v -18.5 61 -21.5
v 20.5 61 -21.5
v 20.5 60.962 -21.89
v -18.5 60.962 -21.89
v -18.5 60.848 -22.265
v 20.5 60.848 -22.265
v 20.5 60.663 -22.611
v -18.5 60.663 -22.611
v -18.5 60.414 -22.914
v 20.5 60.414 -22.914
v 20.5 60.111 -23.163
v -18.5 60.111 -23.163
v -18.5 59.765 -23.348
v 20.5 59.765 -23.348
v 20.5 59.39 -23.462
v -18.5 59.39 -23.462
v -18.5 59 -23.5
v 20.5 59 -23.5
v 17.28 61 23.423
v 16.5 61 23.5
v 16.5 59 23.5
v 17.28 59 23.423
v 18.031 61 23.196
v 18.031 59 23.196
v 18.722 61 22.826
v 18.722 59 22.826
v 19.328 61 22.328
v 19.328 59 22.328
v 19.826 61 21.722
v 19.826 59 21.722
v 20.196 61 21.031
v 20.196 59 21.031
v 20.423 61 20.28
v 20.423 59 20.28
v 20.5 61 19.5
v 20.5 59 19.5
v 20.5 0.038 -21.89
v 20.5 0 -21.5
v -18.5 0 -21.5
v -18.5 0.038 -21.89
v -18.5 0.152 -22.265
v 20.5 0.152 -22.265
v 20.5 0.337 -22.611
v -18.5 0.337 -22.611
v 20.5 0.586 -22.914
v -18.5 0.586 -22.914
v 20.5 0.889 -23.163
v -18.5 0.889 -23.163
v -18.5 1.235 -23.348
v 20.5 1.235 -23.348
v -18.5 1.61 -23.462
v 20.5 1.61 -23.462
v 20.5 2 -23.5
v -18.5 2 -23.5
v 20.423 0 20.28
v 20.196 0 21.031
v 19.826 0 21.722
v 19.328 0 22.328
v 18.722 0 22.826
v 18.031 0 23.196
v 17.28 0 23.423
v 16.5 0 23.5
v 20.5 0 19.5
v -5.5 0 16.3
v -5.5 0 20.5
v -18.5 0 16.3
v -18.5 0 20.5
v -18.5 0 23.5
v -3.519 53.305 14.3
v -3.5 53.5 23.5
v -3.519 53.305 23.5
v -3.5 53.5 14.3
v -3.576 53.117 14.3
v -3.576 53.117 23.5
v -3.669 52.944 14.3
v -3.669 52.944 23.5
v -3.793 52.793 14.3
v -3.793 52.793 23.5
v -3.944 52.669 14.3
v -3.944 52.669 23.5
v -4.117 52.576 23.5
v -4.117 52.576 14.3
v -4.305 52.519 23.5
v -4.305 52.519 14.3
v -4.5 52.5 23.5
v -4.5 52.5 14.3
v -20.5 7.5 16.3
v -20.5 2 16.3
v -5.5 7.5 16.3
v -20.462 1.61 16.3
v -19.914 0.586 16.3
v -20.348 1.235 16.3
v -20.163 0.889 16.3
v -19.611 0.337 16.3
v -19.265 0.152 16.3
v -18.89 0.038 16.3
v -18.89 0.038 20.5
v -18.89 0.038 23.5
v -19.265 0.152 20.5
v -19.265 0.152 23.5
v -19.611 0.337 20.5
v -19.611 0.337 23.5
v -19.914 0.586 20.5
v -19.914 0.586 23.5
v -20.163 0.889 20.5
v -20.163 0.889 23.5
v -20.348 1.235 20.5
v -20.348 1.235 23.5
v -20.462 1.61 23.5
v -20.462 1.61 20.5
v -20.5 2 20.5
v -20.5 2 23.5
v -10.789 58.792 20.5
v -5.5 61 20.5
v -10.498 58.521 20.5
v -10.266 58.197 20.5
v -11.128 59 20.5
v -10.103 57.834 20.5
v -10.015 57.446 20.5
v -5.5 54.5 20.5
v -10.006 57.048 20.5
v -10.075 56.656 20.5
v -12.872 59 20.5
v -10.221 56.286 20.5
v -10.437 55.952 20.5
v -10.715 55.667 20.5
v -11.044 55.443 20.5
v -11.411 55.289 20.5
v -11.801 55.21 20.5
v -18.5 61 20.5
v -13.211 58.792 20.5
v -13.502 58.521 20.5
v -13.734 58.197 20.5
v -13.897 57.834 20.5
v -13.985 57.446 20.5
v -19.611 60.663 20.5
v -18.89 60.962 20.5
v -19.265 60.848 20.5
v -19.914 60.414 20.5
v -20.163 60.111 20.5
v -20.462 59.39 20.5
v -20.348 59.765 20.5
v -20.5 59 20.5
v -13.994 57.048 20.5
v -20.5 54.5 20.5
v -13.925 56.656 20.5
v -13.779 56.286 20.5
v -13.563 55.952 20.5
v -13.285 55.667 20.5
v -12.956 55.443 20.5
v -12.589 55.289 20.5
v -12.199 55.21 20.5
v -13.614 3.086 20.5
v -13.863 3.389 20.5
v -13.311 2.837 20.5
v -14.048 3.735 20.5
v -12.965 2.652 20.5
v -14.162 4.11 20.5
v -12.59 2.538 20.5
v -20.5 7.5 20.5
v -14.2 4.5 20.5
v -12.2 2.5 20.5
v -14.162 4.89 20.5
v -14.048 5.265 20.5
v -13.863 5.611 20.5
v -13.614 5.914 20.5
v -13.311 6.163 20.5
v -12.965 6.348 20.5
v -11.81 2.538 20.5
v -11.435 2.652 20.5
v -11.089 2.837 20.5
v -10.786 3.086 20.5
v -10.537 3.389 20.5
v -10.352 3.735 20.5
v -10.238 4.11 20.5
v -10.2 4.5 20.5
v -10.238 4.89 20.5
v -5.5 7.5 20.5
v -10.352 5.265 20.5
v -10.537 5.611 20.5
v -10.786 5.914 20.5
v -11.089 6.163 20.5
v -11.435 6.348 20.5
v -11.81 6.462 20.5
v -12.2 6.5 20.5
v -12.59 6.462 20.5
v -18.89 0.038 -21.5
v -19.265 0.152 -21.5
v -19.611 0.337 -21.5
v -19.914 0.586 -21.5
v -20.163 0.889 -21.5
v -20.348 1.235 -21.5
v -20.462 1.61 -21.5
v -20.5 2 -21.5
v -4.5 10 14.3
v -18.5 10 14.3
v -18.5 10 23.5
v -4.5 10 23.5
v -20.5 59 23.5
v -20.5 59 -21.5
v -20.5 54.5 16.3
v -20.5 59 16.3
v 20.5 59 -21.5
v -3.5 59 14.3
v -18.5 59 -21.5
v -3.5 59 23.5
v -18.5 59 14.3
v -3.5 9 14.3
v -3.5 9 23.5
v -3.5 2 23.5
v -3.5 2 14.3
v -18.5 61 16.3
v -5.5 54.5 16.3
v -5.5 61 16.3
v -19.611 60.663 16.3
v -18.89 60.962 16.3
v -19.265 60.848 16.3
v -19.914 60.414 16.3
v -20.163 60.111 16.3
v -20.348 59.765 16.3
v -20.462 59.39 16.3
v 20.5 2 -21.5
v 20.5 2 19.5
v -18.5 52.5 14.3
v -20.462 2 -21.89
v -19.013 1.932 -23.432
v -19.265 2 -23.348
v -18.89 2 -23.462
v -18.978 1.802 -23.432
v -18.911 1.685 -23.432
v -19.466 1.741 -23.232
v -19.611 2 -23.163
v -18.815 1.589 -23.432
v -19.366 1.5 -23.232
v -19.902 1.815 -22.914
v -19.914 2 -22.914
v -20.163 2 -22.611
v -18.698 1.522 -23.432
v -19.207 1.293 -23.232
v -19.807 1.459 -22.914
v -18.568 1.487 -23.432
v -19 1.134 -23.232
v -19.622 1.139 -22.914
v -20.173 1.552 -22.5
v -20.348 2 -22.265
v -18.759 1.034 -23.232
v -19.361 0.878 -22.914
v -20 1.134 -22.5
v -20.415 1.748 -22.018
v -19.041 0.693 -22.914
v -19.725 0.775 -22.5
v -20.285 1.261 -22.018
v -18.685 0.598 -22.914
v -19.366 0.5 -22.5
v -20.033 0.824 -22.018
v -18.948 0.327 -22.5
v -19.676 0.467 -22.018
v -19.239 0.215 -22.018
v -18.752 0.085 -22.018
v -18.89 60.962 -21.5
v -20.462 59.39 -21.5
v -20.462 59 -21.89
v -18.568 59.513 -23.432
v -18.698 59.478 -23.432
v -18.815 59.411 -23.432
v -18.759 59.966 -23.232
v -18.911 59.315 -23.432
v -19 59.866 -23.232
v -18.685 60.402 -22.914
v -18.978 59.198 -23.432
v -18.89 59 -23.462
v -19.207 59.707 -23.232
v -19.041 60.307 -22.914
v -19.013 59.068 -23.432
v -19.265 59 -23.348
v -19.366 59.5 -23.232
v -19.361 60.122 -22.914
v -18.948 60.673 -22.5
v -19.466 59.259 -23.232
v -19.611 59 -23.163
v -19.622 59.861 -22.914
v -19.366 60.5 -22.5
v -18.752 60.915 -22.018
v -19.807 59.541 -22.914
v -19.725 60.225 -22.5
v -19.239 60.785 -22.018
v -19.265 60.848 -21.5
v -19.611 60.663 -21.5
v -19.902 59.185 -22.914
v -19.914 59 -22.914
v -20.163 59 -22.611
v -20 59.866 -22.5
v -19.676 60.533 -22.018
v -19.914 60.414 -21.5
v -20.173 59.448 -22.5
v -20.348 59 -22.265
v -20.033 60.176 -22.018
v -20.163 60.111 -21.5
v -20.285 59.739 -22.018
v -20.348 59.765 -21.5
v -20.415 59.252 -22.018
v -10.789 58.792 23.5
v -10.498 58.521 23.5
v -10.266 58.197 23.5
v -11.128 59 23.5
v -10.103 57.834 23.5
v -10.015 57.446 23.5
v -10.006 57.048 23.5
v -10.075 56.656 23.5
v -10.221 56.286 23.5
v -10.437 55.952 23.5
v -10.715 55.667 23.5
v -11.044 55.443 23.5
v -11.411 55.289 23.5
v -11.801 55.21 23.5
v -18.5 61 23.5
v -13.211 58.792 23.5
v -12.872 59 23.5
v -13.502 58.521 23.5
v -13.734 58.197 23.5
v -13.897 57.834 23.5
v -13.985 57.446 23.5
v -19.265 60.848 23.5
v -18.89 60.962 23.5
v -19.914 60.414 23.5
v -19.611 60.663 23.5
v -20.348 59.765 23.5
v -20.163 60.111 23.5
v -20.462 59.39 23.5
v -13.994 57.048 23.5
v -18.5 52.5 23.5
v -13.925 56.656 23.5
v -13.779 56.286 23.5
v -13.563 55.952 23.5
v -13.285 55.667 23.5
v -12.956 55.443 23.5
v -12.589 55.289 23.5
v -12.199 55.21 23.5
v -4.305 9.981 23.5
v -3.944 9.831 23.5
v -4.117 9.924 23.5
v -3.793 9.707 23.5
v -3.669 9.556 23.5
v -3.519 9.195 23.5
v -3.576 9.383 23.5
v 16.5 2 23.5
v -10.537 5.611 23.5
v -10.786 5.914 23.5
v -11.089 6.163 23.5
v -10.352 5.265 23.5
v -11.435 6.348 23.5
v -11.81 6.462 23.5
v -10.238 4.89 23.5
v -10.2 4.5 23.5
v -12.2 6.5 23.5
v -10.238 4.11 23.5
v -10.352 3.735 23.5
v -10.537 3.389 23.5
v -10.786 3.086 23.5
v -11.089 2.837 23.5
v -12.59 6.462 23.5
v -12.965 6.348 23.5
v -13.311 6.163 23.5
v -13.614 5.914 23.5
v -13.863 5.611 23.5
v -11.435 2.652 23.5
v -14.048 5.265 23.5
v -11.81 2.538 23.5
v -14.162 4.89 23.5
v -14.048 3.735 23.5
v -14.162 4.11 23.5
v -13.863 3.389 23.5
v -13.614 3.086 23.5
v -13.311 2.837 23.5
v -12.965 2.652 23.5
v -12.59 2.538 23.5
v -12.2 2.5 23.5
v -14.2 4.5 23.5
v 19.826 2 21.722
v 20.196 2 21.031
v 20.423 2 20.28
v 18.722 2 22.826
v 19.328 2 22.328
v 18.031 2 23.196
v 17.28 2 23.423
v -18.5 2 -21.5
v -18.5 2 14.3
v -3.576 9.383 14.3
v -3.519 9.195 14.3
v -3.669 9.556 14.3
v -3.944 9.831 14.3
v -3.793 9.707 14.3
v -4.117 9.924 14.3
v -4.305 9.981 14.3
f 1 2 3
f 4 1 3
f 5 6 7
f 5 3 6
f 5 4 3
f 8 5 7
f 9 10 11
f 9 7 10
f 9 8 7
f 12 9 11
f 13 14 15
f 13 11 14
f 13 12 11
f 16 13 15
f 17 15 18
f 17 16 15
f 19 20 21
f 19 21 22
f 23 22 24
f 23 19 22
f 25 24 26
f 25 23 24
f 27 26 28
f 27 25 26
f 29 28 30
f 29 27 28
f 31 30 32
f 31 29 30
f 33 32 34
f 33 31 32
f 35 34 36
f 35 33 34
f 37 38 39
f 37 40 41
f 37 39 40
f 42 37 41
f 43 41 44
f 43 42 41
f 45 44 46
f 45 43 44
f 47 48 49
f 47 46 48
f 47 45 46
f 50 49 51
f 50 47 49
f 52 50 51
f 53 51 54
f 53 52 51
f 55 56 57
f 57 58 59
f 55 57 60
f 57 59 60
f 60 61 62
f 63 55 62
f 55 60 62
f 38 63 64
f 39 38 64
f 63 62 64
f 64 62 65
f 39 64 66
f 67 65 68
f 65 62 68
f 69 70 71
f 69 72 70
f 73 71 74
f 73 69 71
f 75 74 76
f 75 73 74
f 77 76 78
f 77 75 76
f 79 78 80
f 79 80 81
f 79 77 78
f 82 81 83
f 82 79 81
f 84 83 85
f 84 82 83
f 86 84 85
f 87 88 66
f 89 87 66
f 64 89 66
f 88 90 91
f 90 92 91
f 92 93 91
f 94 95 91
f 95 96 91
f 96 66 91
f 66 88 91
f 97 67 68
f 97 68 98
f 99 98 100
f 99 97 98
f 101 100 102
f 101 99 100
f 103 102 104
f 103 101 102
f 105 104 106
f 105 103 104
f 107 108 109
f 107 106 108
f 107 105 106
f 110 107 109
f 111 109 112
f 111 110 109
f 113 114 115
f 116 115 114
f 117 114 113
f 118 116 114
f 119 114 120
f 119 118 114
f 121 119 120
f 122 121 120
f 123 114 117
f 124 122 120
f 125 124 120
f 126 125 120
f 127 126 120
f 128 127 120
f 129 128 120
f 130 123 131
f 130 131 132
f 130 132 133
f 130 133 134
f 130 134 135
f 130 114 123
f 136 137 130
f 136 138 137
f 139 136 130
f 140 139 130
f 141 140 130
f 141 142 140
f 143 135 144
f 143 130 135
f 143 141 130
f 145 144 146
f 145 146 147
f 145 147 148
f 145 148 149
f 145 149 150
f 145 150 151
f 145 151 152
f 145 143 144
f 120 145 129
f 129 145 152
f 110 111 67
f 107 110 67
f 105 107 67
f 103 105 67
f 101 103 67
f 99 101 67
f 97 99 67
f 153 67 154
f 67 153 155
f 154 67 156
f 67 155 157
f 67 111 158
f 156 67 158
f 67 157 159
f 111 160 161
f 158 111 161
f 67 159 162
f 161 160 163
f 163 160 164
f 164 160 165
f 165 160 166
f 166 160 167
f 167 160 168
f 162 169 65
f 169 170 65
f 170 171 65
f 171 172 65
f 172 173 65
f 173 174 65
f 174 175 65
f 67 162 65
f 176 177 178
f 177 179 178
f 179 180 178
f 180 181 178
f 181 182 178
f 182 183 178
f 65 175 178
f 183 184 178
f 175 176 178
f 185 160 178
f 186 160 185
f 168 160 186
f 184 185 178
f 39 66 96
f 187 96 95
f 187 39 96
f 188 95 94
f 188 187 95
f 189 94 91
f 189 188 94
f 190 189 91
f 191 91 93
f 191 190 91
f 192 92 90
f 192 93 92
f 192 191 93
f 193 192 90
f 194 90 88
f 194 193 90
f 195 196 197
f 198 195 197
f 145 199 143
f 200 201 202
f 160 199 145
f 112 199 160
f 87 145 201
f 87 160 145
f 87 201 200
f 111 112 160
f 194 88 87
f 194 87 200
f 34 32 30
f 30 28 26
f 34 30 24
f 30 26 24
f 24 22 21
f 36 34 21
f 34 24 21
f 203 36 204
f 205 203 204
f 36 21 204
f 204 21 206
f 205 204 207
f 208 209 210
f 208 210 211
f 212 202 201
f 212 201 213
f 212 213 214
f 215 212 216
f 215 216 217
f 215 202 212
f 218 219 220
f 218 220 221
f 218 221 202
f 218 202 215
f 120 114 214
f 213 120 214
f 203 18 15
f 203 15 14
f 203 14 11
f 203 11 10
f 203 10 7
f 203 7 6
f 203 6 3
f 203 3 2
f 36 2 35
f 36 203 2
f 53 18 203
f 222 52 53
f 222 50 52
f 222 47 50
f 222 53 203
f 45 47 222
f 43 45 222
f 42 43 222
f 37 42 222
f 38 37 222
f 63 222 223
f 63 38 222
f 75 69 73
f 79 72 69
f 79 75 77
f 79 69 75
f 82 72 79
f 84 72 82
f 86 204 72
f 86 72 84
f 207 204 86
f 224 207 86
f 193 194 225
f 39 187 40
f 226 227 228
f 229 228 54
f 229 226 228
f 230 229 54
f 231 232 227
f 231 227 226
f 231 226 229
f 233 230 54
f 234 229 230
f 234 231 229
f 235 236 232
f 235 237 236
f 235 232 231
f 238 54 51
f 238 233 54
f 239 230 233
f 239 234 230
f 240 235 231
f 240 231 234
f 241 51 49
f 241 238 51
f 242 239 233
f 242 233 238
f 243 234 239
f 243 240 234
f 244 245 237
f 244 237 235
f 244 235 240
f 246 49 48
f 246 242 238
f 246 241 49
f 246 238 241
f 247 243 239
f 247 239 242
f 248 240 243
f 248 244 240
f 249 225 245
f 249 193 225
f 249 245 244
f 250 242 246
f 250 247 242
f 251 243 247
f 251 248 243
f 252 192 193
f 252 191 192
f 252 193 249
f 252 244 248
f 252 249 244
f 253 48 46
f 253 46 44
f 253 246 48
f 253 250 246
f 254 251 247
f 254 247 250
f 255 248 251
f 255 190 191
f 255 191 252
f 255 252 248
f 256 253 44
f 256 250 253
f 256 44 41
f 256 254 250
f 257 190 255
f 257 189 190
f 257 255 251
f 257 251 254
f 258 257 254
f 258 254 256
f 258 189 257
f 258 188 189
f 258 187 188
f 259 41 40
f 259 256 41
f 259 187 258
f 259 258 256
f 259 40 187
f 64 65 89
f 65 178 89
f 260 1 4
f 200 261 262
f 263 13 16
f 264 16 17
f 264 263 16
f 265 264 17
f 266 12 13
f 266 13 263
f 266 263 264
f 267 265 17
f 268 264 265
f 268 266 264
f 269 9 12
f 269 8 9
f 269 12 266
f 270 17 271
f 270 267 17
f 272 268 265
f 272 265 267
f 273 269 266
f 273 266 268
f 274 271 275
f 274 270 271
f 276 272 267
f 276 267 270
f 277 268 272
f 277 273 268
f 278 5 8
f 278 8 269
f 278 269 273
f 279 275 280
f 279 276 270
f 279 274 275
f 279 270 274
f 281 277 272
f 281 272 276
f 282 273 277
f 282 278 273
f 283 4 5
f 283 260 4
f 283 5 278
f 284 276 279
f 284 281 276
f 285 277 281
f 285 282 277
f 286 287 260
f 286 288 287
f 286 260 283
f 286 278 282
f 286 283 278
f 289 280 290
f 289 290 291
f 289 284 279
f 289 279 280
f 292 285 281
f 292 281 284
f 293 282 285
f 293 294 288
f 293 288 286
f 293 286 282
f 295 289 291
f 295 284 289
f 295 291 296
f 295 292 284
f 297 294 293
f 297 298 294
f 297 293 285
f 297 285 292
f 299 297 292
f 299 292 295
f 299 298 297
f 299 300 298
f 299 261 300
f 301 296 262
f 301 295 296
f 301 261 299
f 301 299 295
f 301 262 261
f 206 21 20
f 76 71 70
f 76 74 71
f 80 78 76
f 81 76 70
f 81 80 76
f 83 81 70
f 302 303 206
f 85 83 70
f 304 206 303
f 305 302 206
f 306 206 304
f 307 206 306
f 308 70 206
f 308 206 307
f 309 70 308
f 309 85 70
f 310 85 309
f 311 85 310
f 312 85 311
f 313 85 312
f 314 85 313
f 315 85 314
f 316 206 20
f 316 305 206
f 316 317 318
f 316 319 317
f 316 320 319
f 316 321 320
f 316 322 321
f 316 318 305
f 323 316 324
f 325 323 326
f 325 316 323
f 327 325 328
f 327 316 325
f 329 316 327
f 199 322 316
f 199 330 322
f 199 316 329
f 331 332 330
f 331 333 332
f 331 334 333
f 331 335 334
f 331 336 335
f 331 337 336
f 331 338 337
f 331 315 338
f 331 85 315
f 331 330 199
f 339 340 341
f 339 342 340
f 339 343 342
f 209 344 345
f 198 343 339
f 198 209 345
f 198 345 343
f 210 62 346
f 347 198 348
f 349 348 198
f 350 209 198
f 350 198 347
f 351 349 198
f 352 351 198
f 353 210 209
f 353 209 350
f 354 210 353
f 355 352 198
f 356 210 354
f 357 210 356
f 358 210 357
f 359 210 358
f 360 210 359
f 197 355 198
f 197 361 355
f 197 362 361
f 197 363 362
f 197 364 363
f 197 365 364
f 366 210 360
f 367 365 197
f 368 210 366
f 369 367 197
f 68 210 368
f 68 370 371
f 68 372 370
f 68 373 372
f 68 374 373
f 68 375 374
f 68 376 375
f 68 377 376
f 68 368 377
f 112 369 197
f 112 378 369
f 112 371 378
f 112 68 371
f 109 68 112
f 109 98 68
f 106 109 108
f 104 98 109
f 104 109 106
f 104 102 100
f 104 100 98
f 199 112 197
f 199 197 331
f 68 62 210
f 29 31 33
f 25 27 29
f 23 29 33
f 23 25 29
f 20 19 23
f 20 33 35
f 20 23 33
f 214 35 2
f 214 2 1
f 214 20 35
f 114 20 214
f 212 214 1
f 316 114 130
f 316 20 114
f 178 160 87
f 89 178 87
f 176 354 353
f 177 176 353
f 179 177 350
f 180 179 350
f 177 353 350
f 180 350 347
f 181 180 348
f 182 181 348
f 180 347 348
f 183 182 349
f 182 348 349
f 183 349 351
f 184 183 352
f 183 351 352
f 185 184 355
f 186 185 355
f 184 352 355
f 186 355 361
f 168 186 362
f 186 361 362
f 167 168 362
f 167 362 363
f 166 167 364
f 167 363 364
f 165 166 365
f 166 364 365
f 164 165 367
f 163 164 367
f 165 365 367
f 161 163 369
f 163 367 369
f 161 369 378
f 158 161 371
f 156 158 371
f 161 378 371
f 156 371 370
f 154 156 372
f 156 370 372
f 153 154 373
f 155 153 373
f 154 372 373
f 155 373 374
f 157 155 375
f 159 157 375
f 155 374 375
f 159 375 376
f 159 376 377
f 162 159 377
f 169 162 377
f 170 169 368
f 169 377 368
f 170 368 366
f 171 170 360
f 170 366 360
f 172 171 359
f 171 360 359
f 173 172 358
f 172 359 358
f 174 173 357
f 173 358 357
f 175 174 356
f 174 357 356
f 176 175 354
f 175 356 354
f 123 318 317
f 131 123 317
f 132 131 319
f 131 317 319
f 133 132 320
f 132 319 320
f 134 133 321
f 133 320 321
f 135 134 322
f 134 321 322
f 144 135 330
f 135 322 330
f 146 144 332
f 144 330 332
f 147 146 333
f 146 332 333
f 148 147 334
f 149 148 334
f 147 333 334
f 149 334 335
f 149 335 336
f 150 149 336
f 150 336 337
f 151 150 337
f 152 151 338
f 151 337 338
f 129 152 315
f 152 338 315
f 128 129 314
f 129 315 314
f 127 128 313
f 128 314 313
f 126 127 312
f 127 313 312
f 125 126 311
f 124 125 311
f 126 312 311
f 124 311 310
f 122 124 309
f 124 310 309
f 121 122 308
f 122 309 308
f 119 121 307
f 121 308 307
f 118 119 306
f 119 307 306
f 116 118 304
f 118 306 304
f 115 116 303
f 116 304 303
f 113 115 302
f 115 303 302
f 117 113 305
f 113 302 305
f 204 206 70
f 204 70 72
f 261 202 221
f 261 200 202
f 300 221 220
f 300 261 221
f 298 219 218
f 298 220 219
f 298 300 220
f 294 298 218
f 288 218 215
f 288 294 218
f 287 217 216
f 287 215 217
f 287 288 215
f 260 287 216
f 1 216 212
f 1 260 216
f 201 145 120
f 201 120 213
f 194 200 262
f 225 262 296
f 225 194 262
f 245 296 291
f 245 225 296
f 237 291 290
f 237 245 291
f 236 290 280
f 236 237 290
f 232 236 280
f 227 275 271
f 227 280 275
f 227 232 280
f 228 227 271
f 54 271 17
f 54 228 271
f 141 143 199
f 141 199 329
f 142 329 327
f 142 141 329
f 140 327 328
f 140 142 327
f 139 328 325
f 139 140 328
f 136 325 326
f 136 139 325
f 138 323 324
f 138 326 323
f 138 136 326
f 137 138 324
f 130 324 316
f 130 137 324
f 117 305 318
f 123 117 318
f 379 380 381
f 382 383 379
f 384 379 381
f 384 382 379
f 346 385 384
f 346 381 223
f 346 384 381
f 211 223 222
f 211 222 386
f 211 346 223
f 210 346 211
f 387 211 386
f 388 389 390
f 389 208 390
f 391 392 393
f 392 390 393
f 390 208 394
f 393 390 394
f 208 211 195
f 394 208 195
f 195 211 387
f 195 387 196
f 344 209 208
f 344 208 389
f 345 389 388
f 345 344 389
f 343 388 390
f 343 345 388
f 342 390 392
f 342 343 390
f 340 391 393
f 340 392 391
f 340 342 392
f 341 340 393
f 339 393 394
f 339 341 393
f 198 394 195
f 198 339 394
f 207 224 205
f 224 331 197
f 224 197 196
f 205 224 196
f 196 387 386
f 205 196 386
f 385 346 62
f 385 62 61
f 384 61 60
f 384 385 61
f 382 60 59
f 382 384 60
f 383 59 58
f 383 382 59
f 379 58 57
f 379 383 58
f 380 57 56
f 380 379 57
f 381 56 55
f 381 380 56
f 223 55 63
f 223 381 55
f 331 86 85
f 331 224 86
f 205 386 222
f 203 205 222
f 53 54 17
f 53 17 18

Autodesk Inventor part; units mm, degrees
ref_plane "YZ Plane" through (0, 0, 0) normal (1, 0, 0) x (0, 1, 0)
ref_plane "XZ Plane" through (0, 0, 0) normal (0, 1, 0) x (-1, 0, 0)
ref_plane "XY Plane" through (0, 0, 0) normal (0, 0, 1) x (1, 0, 0)
sketch "Esboço1" plane through (0, 0, 0) normal (0, 1, 0) x (-1, 0, 0)
  line L0 (-20.5, 23.5) -> (20.5, 23.5)
  line L1 (20.5, 23.5) -> (20.5, -23.5)
  line L2 (20.5, -23.5) -> (-20.5, -23.5)
  line L3 (-20.5, -23.5) -> (-20.5, 23.5)
  line L4 (-20.5, 23.5) -> (20.5, -23.5) construction
  line L5 (20.5, 23.5) -> (-20.5, -23.5) construction
  point P0 (0, 0)
  dimension "d0" = 41
  dimension "d1" = 47
extrude "Extrusão1" add sketch "Esboço1" along normal blind 61
shell "Casca1" thickness 2 removed faces 2 at (6.8333, 20.3333, 23.5) at (20.5, 20.3333, -7.8333)
sketch "Esboço4" plane through (-20.5, 0, 23.5) normal (0, 0, 1) x (1, 0, 0)
  line L0 (2, 2) -> (2, 59) projected
  line L1 (2, 59) -> (15, 59)
  line L2 (15, 59) -> (15, 54.5)
  line L3 (15, 54.5) -> (2, 54.5)
  line L4 (2, 54.5) -> (2, 59)
  line L5 (41, 2) -> (2, 2) projected
  line L6 (2, 2) -> (15, 2)
  line L7 (15, 2) -> (15, 7.5)
  line L8 (15, 7.5) -> (2, 7.5)
  line L9 (2, 7.5) -> (2, 2)
  arc A0 (7.6282, 59) -> (9.3718, 59) centre (8.5, 57.2) ccw
  circle A1 centre (8.3, 4.5) radius 2
  line L10 (41, 0) -> (0, 0) projected
  line L11 (0, 0) -> (0, 61) projected
  line L12 (0, 61) -> (41, 61) projected
  point P0 (20.5, 0)
  dimension "d15" = 13
  dimension "d16" = 4.5
  dimension "d17" = 13
  dimension "d18" = 5.5
  dimension "d19" = 4
  dimension "d20" = 4
  dimension "d21" = 4.5
  dimension "d22" = 8.3
  dimension "d23" = 3.8
  dimension "d24" = 8.5
extrude "Extrusão2" add sketch "Esboço4" against normal blind 3 contours L0 L1 A0 L2 L3 | L0 L8 L7 L5
fillet "Arredondamento4" radius 4 2 edges at (20.5, 60, 23.5) (20.5, 1, 23.5)
sketch "Esboço11" plane through (-18.5, 2, -21.5) normal (1, 0, 0) x (0, 0, -1)
  line L0 (-42, 5.5) -> (-42, 0) projected
  line L1 (-45, -2) -> (2, -2) projected
  line L2 (-42, 5.5) -> (-37.8, 5.5)
  line L3 (-37.8, 5.5) -> (-37.8, -2)
  line L4 (-37.8, -2) -> (-42, -2)
  line L5 (-42, -2) -> (-42, 5.5)
  line L6 (-42, 57) -> (-42, 52.5) projected
  line L7 (-42, 52.5) -> (-37.8, 52.5)
  line L8 (-37.8, 52.5) -> (-37.8, 59.7447)
  line L9 (-37.8, 59.7447) -> (-42, 59.7447)
  line L10 (-42, 59.7447) -> (-42, 52.5)
  point P0 (-21.5, -2)
  dimension "d47" = 4.2
  dimension "d48" = 4.2
extrude "Extrusão8" cut sketch "Esboço11" along normal blind 13 and the other way blind 2
sketch "Esboço12" plane through (-18.5, 2, -21.5) normal (1, 0, 0) x (0, 0, -1)
  line L0 (-37.8, -2) -> (-37.8, 0) projected
  line L1 (-37.8, -2) -> (-35.8, -2)
  line L2 (-35.8, -2) -> (-35.8, 8)
  line L3 (-35.8, 8) -> (-37.8, 8)
  line L4 (-37.8, 8) -> (-37.8, -2)
  line L5 (-45, 5.5) -> (-42, 5.5) projected
  line L6 (-45, 5.5) -> (-37.8, 5.5)
  line L7 (-37.8, 5.5) -> (-37.8, 8)
  line L8 (-37.8, 8) -> (-45, 8)
  line L9 (-45, 8) -> (-45, 5.5)
  line L10 (-45, 52.5) -> (-42, 52.5) projected
  line L11 (-45, 52.5) -> (-35.8, 52.5)
  line L12 (-35.8, 52.5) -> (-35.8, 50.5)
  line L13 (-35.8, 50.5) -> (-45, 50.5)
  line L14 (-45, 50.5) -> (-45, 52.5)
  line L15 (-37.8, 59) -> (-42, 59) projected
  line L16 (-35.8, 52.5) -> (-37.8, 52.5)
  line L17 (-37.8, 52.5) -> (-37.8, 59)
  line L18 (-37.8, 59) -> (-35.8, 59)
  line L19 (-35.8, 59) -> (-35.8, 52.5)
  point P0 (-21.5, -2)
  dimension "d53" = 2
  dimension "d54" = 10
  dimension "d55" = 9.2
  dimension "d56" = 2
extrude "Extrusão9" add sketch "Esboço12" along normal blind 13
sketch "Esboço13" plane through (-5.5, 54.5, 16.3) normal (1, 0, 0) x (0, 0, -1)
  line L0 (2, -44.5) -> (-7.2, -44.5) projected
  line L1 (2, -52.5) -> (2, -44.5) projected
  line L2 (-7.2, -44.5) -> (2, -44.5)
  line L3 (2, -44.5) -> (2, -52.5)
  line L4 (2, -52.5) -> (-7.2, -52.5)
  line L5 (-7.2, -52.5) -> (-7.2, -44.5)
  line L6 (-7.2, -2) -> (2, -2) projected
  line L7 (-3.2, 4.5) -> (37.8, 4.5) projected
  line L8 (-7.2, -2) -> (2, -2)
  line L9 (2, -2) -> (2, 4.5)
  line L10 (2, 4.5) -> (-7.2, 4.5)
  line L11 (-7.2, 4.5) -> (-7.2, -2)
  point P0 (16.3, -54.5)
extrude "Extrusão10" add sketch "Esboço13" along normal blind 2
fillet "Arredondamento5" radius 2 2 edges at (-20.5, 61, 22) (-20.5, 0, 22)
fillet "Arredondamento6" radius 2 2 edges at (-20.5, 61, -3.6) (-20.5, 0, -3.6)
fillet "Arredondamento7" radius 2 5 edges at (-19.9142, 60.4142, -23.5) (1, 61, -23.5) (-19.9142, 0.5858, -23.5) (1, 0, -23.5) (-20.5, 30.5, -23.5)
fillet "Arredondamento10" radius 1 2 edges at (-3.5, 52.5, 18.9) (-3.5, 10, 18.9)
properties part number "Caixa KS"
